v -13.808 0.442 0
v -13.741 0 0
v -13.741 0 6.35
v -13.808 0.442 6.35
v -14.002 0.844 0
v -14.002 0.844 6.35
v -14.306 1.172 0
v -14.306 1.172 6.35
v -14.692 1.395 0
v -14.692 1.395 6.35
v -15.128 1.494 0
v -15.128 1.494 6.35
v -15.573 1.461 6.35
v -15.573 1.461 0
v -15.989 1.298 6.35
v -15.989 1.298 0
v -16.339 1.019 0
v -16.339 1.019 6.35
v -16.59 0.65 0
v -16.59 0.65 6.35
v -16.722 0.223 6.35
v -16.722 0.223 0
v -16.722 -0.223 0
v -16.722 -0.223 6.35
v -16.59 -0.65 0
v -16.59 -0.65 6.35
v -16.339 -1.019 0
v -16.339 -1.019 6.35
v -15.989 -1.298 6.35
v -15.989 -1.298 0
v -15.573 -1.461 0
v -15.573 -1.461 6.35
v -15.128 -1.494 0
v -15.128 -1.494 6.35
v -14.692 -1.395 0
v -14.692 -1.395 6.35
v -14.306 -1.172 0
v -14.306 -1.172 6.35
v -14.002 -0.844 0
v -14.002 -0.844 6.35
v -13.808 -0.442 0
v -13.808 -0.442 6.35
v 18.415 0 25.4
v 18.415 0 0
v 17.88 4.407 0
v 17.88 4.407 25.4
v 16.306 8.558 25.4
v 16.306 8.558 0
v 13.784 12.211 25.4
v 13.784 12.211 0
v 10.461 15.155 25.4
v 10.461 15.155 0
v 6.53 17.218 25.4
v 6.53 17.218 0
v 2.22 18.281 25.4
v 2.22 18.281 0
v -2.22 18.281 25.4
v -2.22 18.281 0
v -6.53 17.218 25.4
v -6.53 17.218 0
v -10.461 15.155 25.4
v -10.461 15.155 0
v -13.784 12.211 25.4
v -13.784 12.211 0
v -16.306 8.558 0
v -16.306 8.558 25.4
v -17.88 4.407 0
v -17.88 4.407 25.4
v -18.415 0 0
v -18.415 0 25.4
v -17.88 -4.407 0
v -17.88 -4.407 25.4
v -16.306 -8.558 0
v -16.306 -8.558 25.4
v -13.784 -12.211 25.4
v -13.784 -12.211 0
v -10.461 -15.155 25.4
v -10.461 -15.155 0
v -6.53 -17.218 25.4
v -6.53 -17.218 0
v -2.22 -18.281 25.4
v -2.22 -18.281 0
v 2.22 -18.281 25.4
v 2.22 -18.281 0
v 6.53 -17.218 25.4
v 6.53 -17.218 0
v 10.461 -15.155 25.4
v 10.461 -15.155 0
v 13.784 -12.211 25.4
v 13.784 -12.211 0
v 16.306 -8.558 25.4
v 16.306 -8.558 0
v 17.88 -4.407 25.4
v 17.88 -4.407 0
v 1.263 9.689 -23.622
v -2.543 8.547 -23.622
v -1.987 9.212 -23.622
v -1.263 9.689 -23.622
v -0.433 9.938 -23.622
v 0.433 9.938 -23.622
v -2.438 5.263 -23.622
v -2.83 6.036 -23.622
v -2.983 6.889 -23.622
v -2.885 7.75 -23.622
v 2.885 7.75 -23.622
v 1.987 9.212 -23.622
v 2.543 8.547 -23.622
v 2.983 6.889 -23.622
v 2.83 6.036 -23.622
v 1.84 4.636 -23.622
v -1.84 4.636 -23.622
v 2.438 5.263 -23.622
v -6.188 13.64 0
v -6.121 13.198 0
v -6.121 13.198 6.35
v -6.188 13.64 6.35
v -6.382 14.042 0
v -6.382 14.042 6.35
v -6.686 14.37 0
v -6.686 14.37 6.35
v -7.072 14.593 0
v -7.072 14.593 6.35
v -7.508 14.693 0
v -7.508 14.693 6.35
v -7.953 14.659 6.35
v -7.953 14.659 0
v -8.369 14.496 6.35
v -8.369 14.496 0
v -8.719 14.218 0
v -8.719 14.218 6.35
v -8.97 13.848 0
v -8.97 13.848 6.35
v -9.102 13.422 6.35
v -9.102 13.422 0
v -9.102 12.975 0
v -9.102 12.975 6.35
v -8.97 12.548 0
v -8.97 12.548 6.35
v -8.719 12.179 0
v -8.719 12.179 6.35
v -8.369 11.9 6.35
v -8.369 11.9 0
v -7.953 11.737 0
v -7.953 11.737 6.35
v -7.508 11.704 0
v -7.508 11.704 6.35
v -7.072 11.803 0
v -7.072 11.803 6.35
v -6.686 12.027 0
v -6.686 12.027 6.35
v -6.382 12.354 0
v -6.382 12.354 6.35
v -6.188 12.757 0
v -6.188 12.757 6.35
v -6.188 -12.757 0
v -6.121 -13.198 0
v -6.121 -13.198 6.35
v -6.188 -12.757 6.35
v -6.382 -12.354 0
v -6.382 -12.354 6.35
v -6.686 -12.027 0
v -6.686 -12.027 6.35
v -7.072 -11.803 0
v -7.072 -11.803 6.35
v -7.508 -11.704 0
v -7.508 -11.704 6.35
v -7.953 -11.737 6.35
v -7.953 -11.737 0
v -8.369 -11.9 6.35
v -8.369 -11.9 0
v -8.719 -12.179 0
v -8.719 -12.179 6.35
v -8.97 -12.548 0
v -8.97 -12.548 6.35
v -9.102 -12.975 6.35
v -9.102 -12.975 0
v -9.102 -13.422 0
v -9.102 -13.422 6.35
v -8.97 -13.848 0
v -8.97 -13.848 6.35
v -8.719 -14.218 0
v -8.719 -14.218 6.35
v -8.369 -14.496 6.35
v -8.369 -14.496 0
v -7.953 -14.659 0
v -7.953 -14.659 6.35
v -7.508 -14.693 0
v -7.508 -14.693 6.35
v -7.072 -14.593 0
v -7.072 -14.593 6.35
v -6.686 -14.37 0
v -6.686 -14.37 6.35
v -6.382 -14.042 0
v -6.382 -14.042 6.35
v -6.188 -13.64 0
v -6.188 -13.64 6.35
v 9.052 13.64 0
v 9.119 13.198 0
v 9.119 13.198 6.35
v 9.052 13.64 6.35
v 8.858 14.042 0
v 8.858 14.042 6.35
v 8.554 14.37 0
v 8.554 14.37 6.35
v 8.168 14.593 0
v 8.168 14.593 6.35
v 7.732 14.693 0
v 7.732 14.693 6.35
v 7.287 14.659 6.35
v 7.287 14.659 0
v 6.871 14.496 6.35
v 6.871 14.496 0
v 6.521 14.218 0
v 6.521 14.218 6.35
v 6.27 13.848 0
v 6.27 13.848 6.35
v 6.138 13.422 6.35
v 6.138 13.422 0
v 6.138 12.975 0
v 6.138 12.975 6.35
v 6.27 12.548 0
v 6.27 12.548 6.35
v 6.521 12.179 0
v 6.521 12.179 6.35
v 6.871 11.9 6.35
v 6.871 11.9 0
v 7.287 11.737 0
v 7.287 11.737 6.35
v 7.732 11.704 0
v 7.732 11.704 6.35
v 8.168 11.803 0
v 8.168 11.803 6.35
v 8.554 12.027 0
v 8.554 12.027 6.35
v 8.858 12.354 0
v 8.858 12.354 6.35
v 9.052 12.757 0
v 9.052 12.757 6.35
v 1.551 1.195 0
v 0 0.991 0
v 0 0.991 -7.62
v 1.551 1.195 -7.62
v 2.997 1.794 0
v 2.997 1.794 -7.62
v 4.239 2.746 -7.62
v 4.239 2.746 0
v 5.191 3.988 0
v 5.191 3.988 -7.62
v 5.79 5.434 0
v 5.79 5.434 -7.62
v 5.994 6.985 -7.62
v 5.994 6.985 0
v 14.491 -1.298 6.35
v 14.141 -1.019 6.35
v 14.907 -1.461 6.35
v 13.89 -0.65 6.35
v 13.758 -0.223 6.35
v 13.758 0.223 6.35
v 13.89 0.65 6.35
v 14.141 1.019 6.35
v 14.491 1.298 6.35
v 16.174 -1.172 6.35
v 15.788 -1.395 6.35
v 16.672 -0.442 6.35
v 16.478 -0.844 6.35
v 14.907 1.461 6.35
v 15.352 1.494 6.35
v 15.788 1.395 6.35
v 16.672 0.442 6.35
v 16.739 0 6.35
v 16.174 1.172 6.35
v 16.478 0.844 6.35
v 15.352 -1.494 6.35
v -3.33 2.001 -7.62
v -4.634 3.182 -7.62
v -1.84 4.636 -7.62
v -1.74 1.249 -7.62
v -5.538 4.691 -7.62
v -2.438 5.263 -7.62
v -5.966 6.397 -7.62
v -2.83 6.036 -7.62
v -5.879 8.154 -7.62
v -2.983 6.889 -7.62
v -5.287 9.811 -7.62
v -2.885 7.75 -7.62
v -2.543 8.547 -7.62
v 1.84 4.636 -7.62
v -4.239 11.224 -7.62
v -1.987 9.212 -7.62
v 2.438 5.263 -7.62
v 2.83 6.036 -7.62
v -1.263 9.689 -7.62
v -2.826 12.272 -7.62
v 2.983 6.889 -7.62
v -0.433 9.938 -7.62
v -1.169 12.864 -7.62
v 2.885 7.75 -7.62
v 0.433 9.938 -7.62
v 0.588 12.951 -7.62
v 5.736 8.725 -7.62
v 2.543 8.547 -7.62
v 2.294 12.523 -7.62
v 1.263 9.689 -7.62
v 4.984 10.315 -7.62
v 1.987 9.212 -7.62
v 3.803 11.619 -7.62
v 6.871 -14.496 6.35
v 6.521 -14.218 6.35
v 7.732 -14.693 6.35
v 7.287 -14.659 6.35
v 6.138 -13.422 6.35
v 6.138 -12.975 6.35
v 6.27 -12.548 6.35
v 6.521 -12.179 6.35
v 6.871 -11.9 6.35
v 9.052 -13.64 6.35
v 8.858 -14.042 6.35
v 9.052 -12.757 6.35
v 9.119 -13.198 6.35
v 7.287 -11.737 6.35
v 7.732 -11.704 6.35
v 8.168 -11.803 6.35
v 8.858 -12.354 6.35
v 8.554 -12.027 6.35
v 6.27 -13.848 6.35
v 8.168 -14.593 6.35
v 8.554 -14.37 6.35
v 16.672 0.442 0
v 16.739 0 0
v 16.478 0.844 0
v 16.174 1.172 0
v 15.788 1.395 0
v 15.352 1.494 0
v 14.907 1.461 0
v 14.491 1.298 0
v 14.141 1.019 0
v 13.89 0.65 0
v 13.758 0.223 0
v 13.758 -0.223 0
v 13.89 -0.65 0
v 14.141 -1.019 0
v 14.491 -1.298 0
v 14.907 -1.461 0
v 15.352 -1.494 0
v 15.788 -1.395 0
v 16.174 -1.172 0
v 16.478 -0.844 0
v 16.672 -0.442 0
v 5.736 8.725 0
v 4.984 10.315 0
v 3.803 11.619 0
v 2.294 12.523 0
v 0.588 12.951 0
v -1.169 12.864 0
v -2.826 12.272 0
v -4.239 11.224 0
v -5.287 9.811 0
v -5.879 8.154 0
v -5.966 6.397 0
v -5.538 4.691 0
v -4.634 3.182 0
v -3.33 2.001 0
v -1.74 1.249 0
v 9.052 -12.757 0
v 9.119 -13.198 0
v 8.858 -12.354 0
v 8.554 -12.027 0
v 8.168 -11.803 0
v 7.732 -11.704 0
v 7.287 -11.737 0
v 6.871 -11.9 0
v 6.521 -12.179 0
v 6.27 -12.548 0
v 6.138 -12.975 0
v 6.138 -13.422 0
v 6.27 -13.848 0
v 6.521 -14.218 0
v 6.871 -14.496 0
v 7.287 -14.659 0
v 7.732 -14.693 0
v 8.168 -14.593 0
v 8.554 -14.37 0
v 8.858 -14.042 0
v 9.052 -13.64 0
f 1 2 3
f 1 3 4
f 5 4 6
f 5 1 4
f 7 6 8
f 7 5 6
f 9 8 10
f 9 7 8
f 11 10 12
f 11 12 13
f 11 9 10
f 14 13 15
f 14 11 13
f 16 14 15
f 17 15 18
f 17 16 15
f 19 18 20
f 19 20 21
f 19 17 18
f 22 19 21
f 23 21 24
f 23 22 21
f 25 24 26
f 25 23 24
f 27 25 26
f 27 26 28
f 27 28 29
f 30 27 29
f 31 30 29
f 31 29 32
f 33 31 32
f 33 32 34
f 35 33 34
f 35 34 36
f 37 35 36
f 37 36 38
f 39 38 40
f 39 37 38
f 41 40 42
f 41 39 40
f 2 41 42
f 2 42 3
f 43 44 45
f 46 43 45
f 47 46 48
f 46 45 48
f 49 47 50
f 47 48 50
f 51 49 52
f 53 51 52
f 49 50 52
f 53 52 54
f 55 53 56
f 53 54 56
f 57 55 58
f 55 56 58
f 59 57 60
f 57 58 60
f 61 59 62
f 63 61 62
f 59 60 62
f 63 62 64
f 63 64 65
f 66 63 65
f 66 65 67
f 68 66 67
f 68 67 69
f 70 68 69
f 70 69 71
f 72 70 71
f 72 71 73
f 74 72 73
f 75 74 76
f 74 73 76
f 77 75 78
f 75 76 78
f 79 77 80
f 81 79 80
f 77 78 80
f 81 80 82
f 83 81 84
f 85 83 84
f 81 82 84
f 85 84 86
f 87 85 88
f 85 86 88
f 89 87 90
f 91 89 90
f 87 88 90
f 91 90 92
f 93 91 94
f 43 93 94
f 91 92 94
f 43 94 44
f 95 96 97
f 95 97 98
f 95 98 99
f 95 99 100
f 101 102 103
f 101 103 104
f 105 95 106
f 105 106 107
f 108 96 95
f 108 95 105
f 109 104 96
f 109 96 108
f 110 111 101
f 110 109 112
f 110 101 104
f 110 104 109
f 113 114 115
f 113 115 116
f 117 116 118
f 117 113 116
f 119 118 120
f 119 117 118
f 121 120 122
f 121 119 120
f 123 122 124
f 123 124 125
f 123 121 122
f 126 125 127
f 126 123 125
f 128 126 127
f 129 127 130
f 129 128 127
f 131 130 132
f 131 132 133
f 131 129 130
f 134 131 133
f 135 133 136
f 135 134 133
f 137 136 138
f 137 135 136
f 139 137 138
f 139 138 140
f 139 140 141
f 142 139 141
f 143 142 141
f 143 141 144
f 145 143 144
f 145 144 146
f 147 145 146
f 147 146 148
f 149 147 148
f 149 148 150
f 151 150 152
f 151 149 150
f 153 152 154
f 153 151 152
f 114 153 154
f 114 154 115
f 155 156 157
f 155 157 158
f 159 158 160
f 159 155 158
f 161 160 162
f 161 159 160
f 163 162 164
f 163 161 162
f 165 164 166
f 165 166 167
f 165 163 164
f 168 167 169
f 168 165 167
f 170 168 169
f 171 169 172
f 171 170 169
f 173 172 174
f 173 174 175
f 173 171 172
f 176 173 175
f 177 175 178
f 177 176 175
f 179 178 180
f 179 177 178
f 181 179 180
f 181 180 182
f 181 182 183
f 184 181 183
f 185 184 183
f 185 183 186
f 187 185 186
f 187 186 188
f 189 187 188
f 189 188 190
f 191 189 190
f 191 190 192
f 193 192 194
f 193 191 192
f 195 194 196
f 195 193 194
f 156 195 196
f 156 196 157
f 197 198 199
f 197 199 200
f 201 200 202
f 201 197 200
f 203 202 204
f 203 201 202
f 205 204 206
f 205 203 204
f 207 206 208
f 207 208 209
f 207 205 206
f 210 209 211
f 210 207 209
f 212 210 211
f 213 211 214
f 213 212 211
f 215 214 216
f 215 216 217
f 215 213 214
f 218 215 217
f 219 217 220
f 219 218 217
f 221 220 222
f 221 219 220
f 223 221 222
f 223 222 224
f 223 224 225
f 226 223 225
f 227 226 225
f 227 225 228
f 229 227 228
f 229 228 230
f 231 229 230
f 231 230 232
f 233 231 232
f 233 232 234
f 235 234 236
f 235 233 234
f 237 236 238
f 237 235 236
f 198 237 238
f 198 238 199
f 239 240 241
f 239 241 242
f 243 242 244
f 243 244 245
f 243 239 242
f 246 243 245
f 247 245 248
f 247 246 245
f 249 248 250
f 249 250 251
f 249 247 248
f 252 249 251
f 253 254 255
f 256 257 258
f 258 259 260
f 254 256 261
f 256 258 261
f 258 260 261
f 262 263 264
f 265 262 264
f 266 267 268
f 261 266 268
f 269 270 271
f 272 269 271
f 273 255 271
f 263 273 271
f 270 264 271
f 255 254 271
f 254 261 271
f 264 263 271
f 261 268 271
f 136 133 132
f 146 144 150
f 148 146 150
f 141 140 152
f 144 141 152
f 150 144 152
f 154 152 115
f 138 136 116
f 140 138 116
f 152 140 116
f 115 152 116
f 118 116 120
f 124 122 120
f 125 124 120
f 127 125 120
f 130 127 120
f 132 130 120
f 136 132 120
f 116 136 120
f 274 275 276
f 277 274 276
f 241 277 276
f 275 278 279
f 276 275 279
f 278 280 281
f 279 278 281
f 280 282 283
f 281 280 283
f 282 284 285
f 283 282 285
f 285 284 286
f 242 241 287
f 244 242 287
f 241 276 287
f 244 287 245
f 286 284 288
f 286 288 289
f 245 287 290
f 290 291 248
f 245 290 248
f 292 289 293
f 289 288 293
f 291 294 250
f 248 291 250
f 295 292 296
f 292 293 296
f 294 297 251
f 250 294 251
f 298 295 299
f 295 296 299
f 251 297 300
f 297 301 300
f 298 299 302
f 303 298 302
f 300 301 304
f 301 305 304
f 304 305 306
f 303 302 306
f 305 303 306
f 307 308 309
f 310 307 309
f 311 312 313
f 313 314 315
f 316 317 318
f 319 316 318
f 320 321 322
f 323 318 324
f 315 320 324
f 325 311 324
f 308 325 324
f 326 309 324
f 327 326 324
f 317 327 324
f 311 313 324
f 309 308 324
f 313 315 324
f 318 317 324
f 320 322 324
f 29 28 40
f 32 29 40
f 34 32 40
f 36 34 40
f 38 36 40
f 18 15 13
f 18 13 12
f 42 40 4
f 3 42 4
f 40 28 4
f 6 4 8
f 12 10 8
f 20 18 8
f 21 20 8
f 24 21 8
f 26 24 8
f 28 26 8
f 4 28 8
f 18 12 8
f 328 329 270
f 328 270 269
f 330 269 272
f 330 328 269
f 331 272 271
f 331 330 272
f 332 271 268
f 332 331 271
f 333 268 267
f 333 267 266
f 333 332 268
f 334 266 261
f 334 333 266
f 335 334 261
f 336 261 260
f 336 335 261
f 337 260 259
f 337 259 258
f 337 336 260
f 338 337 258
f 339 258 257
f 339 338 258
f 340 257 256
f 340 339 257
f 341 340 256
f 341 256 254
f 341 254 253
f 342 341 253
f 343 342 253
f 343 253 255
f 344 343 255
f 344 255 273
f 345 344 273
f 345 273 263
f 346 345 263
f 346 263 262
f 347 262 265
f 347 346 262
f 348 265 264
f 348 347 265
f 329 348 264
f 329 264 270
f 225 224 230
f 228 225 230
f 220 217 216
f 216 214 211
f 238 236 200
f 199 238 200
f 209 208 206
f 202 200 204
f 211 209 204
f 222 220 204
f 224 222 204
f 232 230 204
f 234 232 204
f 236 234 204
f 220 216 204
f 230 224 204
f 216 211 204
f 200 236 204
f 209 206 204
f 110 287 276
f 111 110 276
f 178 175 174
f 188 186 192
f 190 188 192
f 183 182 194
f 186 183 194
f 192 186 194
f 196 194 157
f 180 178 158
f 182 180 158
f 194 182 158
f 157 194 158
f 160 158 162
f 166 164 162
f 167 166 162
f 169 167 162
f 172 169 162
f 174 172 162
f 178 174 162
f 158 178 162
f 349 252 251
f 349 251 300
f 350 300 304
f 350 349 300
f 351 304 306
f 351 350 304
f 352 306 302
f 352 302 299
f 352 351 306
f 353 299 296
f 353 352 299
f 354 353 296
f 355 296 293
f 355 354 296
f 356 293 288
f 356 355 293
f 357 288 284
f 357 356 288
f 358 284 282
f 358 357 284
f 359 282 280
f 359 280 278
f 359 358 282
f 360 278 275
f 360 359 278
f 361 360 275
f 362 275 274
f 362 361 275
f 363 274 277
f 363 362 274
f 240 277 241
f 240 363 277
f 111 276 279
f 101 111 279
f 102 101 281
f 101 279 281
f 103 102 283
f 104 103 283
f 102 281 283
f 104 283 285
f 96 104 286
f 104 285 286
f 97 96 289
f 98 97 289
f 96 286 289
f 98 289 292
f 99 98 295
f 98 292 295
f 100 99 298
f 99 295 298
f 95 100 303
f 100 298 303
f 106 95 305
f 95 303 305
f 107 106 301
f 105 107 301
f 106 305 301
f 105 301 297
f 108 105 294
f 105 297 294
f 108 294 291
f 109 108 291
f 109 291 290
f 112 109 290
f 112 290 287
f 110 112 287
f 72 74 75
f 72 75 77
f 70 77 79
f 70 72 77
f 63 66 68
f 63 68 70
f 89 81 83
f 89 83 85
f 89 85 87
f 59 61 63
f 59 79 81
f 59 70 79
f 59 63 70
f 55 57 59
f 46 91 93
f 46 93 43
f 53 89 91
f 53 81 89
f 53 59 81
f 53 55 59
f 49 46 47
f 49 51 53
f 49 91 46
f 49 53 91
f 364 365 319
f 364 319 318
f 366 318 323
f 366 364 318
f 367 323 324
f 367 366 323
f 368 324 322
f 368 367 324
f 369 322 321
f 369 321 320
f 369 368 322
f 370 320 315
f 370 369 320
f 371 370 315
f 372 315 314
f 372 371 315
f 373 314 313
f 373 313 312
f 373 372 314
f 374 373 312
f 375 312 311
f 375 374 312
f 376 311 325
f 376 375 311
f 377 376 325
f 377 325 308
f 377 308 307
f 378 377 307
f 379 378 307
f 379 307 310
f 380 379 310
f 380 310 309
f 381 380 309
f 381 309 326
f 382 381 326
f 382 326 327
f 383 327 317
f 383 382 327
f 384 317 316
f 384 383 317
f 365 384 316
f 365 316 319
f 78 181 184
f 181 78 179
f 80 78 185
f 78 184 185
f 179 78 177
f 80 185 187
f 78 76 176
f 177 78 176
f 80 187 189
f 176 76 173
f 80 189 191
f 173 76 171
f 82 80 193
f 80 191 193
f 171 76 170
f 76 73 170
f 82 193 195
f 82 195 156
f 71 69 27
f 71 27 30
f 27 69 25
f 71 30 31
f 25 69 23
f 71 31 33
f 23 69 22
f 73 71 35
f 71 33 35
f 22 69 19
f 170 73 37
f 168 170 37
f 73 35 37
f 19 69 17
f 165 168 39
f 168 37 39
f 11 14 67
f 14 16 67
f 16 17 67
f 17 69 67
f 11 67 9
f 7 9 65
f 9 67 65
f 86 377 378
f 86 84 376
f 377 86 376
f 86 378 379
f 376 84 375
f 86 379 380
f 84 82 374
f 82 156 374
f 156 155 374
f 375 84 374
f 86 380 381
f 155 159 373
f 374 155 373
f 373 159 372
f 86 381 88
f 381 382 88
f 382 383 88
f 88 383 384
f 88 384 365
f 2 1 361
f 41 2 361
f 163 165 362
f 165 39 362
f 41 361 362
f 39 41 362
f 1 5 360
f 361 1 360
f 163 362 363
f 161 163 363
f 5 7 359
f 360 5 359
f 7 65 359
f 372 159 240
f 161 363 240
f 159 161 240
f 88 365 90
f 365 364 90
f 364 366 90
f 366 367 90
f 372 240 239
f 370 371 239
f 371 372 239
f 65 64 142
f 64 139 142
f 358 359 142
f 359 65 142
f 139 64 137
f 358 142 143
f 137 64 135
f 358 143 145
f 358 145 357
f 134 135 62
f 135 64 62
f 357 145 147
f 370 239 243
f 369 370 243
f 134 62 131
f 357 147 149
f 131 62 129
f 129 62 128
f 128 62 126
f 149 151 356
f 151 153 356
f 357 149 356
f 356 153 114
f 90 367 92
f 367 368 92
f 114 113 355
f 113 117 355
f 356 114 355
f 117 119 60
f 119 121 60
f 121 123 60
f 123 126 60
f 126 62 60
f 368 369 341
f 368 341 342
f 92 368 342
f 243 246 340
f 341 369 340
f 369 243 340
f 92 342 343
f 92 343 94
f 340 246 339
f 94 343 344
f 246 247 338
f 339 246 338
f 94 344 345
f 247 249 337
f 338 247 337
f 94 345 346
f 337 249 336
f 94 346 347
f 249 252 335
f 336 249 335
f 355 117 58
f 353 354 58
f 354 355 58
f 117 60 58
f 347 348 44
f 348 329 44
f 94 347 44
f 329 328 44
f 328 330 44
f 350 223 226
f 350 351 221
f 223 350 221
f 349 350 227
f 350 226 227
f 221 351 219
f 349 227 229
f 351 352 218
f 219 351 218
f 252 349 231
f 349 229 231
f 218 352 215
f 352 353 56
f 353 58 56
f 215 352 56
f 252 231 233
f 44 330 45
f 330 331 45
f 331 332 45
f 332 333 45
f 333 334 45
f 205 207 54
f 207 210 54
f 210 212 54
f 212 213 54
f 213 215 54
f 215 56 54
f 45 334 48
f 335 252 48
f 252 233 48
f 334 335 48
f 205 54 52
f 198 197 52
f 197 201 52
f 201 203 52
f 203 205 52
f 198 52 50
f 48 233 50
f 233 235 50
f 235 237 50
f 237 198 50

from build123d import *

# Parameters (mm, degrees)
F0_R     = 18.415
F3_DEPTH = 25.4
F1_R     = 1.4986
F4_DEPTH = 6.35
F5_DEPTH = 7.62
F7_DEPTH = 16.002


with BuildPart() as f3:
    # F0 (on Top) → F3 (new body)
    with BuildSketch(Plane.XY):
        Circle(F0_R)
    extrude(amount=F3_DEPTH)

    # F1 (on Top) → F4 (cut)
    with BuildSketch(Plane.XY):
        with Locations((-15.24, 0)):
            Circle(F1_R)
        with Locations((-7.62, -13.198227)):
            Circle(F1_R)
        with Locations((7.62, -13.198227)):
            Circle(F1_R)
        with BuildLine():
            ThreePointArc((13.7414, 0), (15.24, -1.4986), (16.7386, 0))
            ThreePointArc((16.7386, 0), (15.24, 1.4986), (13.7414, 0))
        make_face()
        with Locations((7.62, 13.198227)):
            Circle(F1_R)
        with Locations((-7.62, 13.198227)):
            Circle(F1_R)
    extrude(amount=F4_DEPTH, mode=Mode.SUBTRACT)

    # F2 (on Top) → F5 (join)
    with BuildSketch(Plane.XY):
        with BuildLine():
            ThreePointArc((0, 0.9906), (4.238681, 2.746319), (5.9944, 6.985))
            ThreePointArc((5.9944, 6.985), (-4.238681, 11.223681), (0, 0.9906))
        make_face()
    extrude(amount=-F5_DEPTH)

    # F6 (on face) → F7 (join)
    with BuildSketch(Plane(origin=(0, 0, -7.62), x_dir=(1, 0, 0), z_dir=(0, 0, -1))):
        with BuildLine():
            Line((1.840405, -4.6355), (0, -4.6355))
            Line((0, -4.6355), (-1.840405, -4.6355))
            ThreePointArc((-1.840405, -4.6355), (0, -9.9695), (1.840405, -4.6355))
        make_face()
    extrude(amount=F7_DEPTH)


solid = f3.part
